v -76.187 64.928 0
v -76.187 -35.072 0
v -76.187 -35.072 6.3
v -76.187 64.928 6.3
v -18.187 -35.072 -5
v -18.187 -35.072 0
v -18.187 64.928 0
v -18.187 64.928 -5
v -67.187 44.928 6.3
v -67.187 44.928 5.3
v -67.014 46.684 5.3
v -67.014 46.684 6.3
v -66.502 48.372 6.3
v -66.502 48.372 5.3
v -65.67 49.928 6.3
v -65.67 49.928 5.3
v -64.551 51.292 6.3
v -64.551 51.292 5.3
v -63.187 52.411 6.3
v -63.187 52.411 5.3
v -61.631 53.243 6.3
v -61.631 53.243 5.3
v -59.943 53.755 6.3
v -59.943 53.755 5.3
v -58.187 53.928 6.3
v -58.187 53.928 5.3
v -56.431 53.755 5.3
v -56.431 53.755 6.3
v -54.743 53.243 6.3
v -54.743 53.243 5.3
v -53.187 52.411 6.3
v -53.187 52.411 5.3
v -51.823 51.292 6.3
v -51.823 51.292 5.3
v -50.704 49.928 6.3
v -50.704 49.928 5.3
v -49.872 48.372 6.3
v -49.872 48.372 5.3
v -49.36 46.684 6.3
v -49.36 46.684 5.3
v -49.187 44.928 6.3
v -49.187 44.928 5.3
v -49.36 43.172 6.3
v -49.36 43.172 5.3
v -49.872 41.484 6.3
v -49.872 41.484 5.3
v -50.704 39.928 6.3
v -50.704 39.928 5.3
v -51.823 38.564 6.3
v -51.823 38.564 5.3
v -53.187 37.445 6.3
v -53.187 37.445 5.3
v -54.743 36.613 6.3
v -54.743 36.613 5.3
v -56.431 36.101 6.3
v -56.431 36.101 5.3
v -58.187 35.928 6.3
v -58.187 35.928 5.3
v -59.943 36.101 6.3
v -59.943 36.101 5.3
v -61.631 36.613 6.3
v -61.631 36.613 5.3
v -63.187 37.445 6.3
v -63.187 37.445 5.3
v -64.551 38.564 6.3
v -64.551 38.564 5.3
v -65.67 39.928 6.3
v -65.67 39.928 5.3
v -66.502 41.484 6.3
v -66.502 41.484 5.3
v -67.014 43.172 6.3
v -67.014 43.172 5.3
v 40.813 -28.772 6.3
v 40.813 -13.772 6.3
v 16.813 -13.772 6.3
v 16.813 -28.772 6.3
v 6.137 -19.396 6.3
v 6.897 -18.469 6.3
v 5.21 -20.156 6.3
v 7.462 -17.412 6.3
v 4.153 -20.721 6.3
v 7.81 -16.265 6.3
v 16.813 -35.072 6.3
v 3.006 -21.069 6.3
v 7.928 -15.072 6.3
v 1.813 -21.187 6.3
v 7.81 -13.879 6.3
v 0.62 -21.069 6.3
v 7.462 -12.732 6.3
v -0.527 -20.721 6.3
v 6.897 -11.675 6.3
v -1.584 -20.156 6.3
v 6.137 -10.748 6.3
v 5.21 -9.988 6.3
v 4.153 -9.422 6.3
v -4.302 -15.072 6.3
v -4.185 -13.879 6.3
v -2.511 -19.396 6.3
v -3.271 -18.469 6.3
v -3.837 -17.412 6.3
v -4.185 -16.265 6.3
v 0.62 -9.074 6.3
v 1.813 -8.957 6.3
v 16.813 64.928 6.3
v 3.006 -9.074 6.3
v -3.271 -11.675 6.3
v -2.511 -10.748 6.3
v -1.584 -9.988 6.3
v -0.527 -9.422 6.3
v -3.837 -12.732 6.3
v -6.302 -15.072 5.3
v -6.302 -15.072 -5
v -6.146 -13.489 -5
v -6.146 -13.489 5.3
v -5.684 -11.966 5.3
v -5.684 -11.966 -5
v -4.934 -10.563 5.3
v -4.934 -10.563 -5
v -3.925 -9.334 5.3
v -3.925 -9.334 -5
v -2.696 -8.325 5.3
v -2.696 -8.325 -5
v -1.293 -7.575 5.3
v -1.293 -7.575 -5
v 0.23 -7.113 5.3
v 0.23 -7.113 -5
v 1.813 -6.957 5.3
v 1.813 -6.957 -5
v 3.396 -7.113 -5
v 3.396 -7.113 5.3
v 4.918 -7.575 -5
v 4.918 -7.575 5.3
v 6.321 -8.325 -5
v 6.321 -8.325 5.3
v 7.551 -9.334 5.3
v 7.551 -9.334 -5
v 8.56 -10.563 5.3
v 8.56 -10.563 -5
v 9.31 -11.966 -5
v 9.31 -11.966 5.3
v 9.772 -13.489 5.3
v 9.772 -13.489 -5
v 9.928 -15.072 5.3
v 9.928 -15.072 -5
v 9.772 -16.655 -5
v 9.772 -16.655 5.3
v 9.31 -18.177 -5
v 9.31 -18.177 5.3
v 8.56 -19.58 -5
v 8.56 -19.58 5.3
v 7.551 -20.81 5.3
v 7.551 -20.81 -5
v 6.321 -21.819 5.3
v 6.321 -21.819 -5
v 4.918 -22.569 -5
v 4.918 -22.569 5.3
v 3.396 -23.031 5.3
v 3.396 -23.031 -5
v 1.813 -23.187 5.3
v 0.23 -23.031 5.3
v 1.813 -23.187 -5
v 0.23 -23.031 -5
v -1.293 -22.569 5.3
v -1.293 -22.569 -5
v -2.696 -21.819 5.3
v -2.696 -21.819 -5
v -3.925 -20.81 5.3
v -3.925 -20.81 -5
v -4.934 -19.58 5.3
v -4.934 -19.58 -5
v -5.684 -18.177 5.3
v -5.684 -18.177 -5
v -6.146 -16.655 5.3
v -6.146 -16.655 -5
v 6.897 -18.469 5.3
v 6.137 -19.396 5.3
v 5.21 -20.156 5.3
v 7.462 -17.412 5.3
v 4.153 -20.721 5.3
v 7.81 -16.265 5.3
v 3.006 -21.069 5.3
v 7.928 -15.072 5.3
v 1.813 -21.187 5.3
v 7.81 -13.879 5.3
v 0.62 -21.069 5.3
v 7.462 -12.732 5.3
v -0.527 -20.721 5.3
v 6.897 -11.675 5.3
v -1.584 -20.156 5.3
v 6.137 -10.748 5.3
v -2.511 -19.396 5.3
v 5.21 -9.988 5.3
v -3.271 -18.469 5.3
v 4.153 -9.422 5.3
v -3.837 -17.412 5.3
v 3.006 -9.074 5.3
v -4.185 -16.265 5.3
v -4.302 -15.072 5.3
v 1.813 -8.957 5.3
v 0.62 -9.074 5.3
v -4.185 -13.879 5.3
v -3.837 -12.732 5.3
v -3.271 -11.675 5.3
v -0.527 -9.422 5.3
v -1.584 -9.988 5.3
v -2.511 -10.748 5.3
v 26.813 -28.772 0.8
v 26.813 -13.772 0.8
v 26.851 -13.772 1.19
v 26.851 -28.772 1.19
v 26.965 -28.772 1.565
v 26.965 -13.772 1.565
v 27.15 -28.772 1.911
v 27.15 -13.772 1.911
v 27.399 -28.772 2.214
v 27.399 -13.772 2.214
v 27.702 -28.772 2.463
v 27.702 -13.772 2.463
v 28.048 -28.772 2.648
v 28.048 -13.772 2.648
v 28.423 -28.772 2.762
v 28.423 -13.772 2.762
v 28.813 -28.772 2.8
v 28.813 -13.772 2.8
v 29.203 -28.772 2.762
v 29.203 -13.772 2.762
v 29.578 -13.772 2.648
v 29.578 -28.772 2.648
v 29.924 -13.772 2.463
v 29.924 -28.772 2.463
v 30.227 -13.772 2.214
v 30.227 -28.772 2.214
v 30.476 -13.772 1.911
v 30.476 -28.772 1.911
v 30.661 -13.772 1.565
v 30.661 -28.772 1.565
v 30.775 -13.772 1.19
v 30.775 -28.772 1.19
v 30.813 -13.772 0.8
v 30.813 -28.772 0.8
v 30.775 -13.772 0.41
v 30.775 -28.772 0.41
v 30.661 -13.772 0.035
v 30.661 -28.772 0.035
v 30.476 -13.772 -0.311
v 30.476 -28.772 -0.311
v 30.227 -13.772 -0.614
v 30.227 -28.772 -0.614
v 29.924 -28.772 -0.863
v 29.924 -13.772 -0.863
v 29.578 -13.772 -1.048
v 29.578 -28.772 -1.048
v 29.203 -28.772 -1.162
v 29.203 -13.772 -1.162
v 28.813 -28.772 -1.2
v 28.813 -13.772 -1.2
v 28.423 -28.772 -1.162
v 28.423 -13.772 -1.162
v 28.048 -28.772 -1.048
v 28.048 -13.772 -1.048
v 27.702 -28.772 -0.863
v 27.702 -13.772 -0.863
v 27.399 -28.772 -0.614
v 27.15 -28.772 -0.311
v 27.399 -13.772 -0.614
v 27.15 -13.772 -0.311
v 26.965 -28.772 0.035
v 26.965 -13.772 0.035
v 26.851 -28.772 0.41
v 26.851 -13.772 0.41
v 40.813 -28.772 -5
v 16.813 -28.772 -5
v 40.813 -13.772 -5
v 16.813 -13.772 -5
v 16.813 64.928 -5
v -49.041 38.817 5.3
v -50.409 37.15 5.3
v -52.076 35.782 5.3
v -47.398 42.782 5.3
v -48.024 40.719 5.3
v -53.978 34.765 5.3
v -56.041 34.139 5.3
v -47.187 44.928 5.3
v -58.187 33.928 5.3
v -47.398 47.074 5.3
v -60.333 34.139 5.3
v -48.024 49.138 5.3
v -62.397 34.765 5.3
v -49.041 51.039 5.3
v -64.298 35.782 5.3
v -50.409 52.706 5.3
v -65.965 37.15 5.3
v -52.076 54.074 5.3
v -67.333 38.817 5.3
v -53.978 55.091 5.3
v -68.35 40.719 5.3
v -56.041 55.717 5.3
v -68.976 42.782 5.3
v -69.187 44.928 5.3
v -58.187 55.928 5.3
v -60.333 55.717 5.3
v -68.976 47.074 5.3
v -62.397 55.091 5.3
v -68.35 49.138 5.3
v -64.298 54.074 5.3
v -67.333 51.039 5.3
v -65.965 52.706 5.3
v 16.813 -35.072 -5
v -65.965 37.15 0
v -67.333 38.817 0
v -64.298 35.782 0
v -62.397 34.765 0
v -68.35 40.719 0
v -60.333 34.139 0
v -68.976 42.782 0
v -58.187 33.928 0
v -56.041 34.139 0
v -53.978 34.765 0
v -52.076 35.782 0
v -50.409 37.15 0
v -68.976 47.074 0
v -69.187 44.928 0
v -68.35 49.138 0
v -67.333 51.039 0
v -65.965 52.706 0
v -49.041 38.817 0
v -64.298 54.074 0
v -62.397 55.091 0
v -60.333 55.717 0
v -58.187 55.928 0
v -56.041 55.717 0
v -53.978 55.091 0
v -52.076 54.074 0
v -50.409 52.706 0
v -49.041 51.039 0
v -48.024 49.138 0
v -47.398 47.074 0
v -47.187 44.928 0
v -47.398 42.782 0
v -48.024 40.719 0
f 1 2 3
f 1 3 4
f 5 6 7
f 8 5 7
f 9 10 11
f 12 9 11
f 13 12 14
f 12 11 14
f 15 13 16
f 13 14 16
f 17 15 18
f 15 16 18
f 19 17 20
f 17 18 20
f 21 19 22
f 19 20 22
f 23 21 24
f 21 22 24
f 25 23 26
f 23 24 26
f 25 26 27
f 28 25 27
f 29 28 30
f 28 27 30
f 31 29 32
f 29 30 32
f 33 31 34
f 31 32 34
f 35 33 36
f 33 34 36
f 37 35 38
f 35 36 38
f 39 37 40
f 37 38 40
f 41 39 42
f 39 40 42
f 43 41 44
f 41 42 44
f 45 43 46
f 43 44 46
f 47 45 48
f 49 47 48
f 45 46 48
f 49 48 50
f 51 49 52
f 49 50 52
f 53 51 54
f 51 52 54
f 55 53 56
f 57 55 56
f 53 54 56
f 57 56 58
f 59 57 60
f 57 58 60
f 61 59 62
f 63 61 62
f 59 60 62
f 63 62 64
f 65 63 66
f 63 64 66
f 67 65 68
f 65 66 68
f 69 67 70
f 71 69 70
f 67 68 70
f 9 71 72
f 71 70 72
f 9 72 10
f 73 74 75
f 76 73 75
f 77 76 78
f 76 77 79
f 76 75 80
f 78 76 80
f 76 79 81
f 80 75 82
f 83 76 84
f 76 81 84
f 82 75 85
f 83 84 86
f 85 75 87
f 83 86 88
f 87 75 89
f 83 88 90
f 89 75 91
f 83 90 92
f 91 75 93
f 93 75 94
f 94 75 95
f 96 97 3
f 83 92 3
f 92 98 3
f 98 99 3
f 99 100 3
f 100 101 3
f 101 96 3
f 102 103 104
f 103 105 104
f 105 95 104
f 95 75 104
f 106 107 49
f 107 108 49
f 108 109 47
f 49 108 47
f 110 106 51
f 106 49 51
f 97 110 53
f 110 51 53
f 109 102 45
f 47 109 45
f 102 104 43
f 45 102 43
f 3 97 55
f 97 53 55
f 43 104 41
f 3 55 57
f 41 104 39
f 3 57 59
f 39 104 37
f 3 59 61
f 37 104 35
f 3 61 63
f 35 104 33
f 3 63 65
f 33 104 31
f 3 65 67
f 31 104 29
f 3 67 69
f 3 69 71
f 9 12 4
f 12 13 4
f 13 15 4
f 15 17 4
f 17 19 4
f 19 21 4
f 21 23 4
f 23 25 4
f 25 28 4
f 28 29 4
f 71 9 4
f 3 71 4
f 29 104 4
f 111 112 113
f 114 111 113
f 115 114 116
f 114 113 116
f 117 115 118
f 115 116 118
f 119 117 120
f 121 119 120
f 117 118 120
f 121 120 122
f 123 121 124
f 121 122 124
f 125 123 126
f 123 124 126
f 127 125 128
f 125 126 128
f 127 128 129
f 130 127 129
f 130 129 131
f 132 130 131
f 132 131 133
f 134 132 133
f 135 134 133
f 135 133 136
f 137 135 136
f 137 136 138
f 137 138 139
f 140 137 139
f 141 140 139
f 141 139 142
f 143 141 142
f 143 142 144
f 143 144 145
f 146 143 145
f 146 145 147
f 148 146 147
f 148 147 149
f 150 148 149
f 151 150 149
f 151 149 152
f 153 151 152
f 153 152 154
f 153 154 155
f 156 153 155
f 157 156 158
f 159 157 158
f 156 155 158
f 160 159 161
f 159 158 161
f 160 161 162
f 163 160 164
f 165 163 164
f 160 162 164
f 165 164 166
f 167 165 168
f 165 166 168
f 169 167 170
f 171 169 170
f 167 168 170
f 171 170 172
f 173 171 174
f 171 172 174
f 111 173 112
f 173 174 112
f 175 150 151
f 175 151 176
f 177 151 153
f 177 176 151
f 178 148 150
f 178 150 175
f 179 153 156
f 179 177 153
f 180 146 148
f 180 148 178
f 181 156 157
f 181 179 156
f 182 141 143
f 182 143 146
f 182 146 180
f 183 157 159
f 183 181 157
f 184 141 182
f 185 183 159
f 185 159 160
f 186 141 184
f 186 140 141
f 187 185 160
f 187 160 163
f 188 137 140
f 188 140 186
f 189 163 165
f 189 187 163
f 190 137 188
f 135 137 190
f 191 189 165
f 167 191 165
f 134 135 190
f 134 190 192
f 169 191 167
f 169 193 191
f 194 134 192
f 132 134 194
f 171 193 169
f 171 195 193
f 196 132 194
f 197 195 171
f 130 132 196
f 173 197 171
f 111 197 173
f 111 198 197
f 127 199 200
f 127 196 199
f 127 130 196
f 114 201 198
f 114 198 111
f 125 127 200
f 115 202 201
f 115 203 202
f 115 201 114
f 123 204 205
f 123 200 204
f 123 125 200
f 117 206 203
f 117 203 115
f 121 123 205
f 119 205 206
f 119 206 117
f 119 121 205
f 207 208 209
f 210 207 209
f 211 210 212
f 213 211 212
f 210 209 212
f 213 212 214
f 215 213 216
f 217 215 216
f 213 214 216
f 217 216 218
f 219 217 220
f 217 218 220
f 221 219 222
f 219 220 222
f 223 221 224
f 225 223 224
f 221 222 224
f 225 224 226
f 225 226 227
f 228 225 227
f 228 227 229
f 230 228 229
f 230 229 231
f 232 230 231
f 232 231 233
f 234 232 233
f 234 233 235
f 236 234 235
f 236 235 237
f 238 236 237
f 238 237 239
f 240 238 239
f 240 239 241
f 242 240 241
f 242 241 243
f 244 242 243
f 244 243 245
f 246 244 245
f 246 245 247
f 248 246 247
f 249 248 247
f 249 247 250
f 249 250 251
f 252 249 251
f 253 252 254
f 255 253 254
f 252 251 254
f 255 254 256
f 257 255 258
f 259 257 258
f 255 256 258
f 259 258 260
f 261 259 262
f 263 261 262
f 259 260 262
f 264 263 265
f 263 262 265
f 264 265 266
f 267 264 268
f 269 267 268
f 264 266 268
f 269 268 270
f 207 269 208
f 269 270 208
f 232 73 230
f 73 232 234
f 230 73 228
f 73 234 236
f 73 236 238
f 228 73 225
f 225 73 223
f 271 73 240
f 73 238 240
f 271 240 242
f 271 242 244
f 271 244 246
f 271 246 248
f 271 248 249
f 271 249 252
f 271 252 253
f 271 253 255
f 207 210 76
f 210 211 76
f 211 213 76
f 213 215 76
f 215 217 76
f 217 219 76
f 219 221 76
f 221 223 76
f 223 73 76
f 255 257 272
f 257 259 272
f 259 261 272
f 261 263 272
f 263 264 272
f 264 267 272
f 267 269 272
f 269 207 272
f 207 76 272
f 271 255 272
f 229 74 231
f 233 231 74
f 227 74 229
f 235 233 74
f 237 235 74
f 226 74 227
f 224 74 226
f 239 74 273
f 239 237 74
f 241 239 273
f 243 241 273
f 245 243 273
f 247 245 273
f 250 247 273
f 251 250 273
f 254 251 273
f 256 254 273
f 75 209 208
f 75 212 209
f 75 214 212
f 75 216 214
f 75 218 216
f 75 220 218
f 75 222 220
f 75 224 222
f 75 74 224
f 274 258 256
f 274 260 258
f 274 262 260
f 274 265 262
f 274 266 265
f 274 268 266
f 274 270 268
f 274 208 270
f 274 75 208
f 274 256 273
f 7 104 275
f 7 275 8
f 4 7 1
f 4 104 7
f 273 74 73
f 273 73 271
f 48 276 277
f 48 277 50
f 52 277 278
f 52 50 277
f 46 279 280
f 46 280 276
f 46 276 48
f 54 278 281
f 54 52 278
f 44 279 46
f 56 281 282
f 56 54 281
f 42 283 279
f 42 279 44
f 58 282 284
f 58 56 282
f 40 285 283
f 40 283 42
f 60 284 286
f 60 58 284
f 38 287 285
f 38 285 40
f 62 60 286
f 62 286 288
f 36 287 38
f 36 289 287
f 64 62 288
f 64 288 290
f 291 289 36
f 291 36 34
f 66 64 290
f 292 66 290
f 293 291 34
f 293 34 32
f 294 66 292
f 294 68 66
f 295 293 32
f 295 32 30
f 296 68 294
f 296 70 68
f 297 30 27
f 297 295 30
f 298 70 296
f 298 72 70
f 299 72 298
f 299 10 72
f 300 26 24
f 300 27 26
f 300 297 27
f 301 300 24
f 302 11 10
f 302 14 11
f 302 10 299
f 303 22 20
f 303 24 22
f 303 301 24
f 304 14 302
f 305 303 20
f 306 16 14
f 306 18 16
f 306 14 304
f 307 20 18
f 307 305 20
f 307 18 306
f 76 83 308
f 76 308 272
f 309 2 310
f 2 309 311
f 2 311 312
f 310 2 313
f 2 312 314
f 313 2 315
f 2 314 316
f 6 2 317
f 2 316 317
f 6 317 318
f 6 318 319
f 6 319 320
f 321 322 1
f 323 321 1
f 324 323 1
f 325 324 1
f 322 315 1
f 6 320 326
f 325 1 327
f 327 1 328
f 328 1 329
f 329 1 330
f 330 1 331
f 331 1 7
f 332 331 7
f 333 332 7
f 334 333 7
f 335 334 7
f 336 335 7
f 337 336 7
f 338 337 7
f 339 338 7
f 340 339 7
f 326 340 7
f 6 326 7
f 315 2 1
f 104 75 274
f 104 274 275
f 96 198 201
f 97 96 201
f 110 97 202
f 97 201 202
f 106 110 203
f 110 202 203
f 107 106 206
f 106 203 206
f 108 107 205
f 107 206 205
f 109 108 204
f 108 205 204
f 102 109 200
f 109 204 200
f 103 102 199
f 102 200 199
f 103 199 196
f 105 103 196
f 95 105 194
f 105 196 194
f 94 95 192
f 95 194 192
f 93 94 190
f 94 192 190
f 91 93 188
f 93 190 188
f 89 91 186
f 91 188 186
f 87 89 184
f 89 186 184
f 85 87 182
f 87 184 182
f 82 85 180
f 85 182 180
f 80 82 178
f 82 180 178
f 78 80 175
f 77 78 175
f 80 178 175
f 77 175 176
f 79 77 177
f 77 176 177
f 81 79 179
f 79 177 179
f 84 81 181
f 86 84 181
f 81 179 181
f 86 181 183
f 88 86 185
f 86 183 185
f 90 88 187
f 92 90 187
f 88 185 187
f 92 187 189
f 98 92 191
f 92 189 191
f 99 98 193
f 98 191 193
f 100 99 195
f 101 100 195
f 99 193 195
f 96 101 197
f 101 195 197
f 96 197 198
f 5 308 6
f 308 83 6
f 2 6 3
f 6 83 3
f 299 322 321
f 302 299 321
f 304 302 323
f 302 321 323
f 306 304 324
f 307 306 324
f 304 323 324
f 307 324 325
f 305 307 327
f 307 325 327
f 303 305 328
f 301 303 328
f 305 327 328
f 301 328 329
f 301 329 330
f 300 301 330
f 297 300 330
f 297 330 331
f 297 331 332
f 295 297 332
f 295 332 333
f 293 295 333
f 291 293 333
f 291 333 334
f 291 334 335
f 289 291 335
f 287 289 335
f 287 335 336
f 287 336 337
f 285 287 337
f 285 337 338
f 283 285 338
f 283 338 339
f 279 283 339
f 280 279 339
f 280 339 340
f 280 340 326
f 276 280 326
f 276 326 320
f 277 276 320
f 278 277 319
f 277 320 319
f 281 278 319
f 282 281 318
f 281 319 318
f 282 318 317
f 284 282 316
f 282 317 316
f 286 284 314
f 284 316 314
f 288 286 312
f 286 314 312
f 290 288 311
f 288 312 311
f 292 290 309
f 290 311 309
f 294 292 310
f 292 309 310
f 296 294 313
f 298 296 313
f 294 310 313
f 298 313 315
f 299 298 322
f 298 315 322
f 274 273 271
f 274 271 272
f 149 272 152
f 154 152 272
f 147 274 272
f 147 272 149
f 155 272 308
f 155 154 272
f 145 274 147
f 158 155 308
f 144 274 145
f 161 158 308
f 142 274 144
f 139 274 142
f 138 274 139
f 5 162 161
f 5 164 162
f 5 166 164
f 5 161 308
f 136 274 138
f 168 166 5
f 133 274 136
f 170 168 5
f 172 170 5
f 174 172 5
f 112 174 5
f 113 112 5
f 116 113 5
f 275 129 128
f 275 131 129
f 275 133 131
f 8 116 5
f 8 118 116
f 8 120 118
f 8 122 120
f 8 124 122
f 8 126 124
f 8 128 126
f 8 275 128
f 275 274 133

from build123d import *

# Parameters (mm, degrees)
SKETCH1_W           = 93
SKETCH1_H           = 100
BOSS_EXTRUDE2_DEPTH = 6.3
SKETCH3_W           = 35
SKETCH3_H           = 100
BOSS_EXTRUDE3_DEPTH = 5
SKETCH4_W           = 11.3
SKETCH4_H           = 15
BOSS_EXTRUDE4_DEPTH = 24
SKETCH5_R           = 2
CUT_EXTRUDE1_DEPTH  = 50
SKETCH6_R           = 8.115
CUT_EXTRUDE2_DEPTH  = 50
SKETCH7_R           = 11
CUT_EXTRUDE3_DEPTH  = 50
EXTRUDE_THIN1_START = -5.3
SKETCH7_2_R         = 11
SKETCH7_2_R_2       = 9
EXTRUDE_THIN1_DEPTH = 1
EXTRUDE_THIN2_START = -10.3
SKETCH6_2_R         = 8.115
SKETCH6_2_R_2       = 6.115
EXTRUDE_THIN2_DEPTH = 1


with BuildPart() as part:
    # Sketch1 → Boss-Extrude2 (new body)
    with BuildSketch(Plane.XY):
        with Locations((-29.68705036, 14.928057554)):
            Rectangle(SKETCH1_W, SKETCH1_H)
    extrude(amount=BOSS_EXTRUDE2_DEPTH)

    # Sketch3 → Boss-Extrude3 (add)
    with BuildSketch(Plane(origin=(0, 0, 0), x_dir=(-1, 0, 0), z_dir=(0, 0, -1))):
        with Locations((0.68705036, 14.928057554)):
            Rectangle(SKETCH3_W, SKETCH3_H)
    extrude(amount=BOSS_EXTRUDE3_DEPTH)

    # Sketch4 → Boss-Extrude4 (add)
    with BuildSketch(Plane(origin=(16.81294964, 0, 0), x_dir=(0, 0, -1), z_dir=(1, 0, 0))):
        with Locations((-0.65, -21.271942446)):
            Rectangle(SKETCH4_W, SKETCH4_H)
    extrude(amount=BOSS_EXTRUDE4_DEPTH)

    # Sketch5 → Cut-Extrude1 (cut)
    with BuildSketch(Plane(origin=(0, -13.771942446, 0), x_dir=(1, 0, 0), z_dir=(0, 1, 0))):
        with Locations(Location((28.81294964, -0.8, 0), (0, 0, 180))):
            Circle(SKETCH5_R)
    extrude(amount=-CUT_EXTRUDE1_DEPTH, mode=Mode.SUBTRACT)

    # Sketch6 → Cut-Extrude2 (cut)
    with BuildSketch(Plane(origin=(0, 0, -5), x_dir=(-1, 0, 0), z_dir=(0, 0, -1))):
        with Locations((-1.81294964, -15.071942446)):
            Circle(SKETCH6_R)
    extrude(amount=-CUT_EXTRUDE2_DEPTH, mode=Mode.SUBTRACT)

    # Sketch7 → Cut-Extrude3 (cut)
    with BuildSketch(Plane(origin=(0, 0, 0), x_dir=(-1, 0, 0), z_dir=(0, 0, -1))):
        with Locations((58.18705036, 44.928057554)):
            Circle(SKETCH7_R)
    extrude(amount=-CUT_EXTRUDE3_DEPTH, mode=Mode.SUBTRACT)

    # Sketch7<2> → Extrude-Thin1 (add)
    with BuildSketch(Plane(origin=(0, 0, 0), x_dir=(-1, 0, 0), z_dir=(0, 0, -1)).offset(EXTRUDE_THIN1_START)):
        with Locations((58.18705036, 44.928057554)):
            Circle(SKETCH7_2_R)
        with Locations((58.18705036, 44.928057554)):
            Circle(SKETCH7_2_R_2, mode=Mode.SUBTRACT)
    extrude(amount=-EXTRUDE_THIN1_DEPTH)

    # Sketch6<2> → Extrude-Thin2 (add)
    with BuildSketch(Plane(origin=(0, 0, -5), x_dir=(-1, 0, 0), z_dir=(0, 0, -1)).offset(EXTRUDE_THIN2_START)):
        with Locations((-1.81294964, -15.071942446)):
            Circle(SKETCH6_2_R)
        with Locations((-1.81294964, -15.071942446)):
            Circle(SKETCH6_2_R_2, mode=Mode.SUBTRACT)
    extrude(amount=-EXTRUDE_THIN2_DEPTH)


solid = part.part
